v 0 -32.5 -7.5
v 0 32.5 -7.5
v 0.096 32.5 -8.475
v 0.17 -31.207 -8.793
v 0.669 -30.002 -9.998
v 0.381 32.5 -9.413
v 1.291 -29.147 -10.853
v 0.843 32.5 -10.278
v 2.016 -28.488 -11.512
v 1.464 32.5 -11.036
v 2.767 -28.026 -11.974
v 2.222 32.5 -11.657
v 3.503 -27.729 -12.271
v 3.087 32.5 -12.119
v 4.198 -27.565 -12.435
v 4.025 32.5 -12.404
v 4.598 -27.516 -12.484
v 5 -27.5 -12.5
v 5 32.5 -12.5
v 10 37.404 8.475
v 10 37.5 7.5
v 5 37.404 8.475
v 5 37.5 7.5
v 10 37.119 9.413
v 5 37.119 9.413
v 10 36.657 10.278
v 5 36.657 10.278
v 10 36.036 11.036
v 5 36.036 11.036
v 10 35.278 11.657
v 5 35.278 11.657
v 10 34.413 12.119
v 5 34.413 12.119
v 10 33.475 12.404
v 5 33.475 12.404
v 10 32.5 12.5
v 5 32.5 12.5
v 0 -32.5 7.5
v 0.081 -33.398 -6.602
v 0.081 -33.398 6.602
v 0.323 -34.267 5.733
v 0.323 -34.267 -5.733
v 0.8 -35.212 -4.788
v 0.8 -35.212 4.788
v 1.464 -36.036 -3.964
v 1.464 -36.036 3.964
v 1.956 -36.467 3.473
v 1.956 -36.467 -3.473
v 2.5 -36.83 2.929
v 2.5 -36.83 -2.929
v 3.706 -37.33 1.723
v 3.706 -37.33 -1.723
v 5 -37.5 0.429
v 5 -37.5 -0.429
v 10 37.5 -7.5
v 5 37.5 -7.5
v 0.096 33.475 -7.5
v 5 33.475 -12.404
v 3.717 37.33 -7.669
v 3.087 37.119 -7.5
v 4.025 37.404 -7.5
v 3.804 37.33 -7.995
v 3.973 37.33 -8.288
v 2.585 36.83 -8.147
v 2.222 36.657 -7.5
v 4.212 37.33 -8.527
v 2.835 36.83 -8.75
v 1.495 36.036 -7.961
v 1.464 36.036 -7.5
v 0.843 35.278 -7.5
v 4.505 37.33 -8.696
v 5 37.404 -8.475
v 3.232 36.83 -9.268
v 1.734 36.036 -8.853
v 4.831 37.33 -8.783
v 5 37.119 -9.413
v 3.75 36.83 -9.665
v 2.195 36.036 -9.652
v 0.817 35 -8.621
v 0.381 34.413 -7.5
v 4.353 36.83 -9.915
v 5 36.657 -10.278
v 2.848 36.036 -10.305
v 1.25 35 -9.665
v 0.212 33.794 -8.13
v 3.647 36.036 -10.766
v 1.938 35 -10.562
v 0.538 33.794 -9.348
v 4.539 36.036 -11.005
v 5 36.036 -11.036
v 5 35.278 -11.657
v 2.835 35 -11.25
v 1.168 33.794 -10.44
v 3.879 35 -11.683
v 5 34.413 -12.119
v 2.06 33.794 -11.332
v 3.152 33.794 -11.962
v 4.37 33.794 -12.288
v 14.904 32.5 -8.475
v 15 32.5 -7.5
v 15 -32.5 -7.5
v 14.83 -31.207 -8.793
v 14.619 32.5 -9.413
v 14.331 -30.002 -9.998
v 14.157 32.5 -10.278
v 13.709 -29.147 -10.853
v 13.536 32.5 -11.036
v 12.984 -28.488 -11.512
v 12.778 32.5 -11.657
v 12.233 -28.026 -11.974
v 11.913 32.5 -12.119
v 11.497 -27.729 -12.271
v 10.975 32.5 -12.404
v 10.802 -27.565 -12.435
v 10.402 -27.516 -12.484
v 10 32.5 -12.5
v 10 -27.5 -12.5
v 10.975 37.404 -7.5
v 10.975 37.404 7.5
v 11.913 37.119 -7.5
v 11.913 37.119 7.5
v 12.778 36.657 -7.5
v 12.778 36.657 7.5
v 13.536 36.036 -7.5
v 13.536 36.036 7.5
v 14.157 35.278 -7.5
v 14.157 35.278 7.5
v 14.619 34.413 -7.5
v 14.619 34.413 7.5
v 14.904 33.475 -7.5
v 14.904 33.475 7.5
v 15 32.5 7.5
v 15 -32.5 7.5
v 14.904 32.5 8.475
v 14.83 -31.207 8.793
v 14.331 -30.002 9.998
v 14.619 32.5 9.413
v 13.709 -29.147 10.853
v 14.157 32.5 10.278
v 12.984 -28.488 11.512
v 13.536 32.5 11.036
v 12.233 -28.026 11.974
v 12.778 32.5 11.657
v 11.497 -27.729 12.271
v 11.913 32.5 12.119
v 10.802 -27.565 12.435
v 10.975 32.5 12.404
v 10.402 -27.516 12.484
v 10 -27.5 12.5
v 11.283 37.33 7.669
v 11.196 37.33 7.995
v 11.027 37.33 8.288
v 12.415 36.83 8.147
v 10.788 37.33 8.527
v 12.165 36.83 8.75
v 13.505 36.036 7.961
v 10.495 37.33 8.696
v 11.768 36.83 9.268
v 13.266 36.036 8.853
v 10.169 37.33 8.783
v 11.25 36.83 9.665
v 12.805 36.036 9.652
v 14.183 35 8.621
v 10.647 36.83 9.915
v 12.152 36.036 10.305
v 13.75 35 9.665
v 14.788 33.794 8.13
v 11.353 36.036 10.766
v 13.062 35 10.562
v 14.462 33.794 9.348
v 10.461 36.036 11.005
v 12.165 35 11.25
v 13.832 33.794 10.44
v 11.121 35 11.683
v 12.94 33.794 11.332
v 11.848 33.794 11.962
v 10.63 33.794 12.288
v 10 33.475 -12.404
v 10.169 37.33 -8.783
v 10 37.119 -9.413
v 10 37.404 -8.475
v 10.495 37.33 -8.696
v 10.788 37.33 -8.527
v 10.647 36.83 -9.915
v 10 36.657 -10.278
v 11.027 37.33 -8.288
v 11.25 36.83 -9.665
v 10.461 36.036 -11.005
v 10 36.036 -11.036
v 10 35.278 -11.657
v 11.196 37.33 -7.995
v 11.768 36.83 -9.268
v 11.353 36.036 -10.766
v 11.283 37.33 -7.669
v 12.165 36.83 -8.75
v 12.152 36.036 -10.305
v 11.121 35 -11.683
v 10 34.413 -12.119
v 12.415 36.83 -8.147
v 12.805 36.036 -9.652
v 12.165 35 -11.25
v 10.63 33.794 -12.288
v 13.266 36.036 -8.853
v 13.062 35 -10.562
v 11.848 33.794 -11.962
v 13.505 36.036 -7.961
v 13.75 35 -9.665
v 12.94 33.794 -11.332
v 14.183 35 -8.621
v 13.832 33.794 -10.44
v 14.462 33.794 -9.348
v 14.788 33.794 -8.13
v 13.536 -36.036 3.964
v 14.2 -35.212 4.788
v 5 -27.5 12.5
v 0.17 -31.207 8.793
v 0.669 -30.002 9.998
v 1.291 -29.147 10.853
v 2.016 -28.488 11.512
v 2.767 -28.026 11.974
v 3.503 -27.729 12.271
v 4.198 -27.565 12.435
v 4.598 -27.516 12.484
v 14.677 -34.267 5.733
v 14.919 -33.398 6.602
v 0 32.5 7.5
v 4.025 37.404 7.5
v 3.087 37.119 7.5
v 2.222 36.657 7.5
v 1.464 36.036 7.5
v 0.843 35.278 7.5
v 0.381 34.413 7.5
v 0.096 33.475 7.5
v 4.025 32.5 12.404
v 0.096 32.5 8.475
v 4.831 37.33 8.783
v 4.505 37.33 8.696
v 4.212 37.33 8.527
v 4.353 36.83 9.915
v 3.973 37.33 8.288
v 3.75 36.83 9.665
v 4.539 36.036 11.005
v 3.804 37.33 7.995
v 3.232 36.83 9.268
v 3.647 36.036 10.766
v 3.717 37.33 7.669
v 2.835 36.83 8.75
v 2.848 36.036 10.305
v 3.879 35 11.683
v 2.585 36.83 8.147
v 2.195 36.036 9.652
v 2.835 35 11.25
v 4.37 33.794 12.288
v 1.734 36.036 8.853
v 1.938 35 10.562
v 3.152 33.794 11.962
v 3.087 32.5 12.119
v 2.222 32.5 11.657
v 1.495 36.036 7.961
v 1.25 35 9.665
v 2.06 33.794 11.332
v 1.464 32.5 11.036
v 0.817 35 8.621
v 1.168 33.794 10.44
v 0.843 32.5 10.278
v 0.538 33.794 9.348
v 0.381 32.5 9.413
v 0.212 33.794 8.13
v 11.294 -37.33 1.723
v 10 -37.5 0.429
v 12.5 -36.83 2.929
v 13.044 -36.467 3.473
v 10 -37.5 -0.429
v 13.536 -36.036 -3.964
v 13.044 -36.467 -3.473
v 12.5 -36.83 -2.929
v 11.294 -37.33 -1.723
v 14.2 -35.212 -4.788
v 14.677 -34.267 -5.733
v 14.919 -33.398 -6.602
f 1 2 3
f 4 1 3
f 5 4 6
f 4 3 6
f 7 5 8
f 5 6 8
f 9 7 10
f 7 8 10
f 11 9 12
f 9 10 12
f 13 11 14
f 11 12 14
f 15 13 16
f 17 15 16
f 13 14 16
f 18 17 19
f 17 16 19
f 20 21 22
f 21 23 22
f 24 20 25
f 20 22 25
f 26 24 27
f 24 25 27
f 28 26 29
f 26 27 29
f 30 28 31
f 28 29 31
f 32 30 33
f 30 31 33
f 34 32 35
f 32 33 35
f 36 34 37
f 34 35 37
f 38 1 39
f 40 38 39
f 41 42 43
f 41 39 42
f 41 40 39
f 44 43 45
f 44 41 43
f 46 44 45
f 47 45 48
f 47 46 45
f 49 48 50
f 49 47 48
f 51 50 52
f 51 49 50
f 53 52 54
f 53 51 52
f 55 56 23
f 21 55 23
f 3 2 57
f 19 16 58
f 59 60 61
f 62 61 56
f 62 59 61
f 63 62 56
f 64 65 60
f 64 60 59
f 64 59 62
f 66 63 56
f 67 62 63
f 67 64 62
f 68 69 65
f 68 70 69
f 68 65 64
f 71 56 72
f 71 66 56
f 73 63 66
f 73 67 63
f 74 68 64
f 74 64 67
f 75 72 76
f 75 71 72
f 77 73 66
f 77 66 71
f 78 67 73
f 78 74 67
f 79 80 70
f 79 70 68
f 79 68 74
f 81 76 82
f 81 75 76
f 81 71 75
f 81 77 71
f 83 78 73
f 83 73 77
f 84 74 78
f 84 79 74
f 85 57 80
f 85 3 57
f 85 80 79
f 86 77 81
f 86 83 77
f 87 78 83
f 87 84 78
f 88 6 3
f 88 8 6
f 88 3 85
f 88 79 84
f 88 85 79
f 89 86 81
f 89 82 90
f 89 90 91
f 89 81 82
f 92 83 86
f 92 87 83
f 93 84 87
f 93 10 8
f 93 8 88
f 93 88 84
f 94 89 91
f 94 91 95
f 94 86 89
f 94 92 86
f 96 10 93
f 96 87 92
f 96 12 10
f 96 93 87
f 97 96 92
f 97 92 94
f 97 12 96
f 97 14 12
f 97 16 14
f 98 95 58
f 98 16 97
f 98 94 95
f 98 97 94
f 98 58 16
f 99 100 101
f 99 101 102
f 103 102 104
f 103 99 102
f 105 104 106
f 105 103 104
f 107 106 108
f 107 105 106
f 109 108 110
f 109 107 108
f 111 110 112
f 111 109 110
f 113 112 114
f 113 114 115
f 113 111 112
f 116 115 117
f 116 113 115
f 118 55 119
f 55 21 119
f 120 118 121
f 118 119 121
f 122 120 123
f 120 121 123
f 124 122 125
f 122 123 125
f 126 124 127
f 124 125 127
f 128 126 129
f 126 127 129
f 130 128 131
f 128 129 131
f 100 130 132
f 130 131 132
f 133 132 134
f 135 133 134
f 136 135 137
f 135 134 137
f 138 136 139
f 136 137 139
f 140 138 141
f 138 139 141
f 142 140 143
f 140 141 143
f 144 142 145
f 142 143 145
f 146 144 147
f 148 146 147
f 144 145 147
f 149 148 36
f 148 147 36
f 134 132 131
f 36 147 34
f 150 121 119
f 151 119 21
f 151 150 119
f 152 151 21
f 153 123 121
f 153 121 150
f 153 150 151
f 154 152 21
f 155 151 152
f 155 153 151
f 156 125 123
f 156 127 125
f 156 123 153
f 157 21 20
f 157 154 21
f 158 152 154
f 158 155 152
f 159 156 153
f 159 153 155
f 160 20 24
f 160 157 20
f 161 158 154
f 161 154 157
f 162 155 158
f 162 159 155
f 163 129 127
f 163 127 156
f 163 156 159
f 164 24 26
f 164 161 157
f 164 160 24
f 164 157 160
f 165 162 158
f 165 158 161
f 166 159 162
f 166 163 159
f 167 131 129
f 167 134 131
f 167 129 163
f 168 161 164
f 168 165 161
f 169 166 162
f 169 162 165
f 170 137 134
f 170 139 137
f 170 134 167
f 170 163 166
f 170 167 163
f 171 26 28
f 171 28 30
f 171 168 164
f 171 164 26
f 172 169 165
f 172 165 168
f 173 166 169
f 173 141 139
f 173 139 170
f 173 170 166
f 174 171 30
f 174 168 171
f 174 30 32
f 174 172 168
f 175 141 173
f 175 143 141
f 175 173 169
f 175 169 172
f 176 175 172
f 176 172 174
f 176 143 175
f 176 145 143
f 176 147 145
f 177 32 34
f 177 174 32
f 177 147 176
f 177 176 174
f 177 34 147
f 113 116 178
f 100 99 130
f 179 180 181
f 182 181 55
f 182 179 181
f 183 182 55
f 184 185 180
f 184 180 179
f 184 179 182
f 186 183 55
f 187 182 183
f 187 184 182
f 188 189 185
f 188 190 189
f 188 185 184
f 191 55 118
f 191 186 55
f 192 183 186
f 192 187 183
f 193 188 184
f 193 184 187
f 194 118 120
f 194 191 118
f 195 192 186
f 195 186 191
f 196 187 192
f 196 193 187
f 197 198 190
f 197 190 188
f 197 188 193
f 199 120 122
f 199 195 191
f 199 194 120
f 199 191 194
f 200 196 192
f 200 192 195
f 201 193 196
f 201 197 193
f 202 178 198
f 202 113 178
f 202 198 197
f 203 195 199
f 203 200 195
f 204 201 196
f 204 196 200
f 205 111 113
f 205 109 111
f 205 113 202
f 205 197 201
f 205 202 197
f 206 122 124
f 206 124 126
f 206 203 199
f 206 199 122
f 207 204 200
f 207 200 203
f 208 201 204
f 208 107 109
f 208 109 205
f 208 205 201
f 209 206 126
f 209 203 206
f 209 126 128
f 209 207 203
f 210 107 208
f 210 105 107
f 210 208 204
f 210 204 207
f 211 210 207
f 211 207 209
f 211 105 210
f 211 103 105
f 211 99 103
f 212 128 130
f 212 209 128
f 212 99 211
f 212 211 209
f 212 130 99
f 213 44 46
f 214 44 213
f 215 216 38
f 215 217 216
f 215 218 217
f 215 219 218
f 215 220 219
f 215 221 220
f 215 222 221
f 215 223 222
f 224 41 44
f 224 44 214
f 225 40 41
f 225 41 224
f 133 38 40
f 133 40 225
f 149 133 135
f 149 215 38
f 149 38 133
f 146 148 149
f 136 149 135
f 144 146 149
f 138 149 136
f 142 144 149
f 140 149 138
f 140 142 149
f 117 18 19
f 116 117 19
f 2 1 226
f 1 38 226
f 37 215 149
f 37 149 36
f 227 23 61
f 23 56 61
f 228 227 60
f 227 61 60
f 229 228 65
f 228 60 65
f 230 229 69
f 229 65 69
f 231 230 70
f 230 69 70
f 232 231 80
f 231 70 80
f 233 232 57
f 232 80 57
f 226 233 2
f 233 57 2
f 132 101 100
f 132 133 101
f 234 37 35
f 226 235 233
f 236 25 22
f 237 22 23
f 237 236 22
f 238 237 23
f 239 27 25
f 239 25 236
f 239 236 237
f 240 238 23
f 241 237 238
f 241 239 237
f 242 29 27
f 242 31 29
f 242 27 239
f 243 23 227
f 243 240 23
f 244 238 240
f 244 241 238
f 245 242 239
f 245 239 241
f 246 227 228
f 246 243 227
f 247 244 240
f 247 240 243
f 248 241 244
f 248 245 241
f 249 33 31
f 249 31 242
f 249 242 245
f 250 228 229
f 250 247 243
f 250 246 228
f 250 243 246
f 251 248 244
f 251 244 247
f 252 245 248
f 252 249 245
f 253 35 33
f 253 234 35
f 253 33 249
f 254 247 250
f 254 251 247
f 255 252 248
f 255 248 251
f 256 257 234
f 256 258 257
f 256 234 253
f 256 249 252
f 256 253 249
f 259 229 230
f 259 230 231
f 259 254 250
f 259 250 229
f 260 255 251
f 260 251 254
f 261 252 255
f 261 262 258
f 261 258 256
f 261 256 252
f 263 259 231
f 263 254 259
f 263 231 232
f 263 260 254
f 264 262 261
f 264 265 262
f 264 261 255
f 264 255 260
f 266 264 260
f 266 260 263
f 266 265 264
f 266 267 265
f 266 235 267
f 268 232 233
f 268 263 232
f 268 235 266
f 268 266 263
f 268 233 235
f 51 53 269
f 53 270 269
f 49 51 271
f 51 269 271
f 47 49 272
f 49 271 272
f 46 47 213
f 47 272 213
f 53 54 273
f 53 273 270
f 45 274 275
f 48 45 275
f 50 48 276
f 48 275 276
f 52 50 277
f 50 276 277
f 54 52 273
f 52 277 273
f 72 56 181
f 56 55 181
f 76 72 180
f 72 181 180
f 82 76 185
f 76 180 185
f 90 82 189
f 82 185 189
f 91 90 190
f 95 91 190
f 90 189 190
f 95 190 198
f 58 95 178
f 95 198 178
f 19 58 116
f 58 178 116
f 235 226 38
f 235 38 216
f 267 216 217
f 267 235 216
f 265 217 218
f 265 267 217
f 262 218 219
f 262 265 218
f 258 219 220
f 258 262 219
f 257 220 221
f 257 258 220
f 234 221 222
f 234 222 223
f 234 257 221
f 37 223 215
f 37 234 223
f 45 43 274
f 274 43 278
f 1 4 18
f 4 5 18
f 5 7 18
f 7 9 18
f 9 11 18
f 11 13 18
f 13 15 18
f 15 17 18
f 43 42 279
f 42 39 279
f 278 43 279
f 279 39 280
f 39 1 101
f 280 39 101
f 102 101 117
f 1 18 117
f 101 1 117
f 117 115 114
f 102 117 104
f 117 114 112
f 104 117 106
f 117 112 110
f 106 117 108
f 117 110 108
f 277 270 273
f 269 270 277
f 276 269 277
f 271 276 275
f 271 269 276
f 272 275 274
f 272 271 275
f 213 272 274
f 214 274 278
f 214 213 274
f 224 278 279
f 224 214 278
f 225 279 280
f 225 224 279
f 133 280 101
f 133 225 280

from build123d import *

# Parameters (mm, degrees)
F0_W     = 75
F0_H     = 25
F1_DEPTH = 15
F2_SIZE  = 10
F3_SIZE  = 10
F4_R     = 5
F5_R     = 5
F6_R     = 4.99999


# Not quite as in the source:
# - a fillet or chamfer is up to 0.001 mm smaller than in the source, because OpenCascade refuses the exact size


with BuildPart() as f1:
    # F0 (on Right) → F1 (new body)
    with BuildSketch(Plane.YZ):
        Rectangle(F0_W, F0_H)
    extrude(amount=F1_DEPTH)

    # F2
    f2_edges = [f1.edges().sort_by_distance(p)[0] for p in [
        (7.5, -37.5, 12.5),
    ]]
    chamfer(f2_edges, length=F2_SIZE)

    # F3
    f3_edges = [f1.edges().sort_by_distance(p)[0] for p in [
        (7.5, -37.5, -12.5),
    ]]
    chamfer(f3_edges, length=F3_SIZE)

    # F4
    f4_edges = [f1.edges().sort_by_distance(p)[0] for p in [
        (15, 5, 12.5),
        (0, 5, 12.5),
        (15, 5, -12.5),
        (0, 5, -12.5),
    ]]
    fillet(f4_edges, radius=F4_R)

    # F5
    f5_edges = [f1.edges().sort_by_distance(p)[0] for p in [
        (7.5, 37.5, -12.5),
        (1.464466, 37.5, -11.035534),
        (13.535534, 37.5, -11.035534),
        (0, 37.5, 0),
        (15, 37.5, 0),
        (1.464466, 37.5, 11.035534),
        (13.535534, 37.5, 11.035534),
        (7.5, 37.5, 12.5),
    ]]
    fillet(f5_edges, radius=F5_R)

    # F6 (radius 5 in the source; OpenCascade refuses exactly that, so slightly less here)
    f6_edges = [f1.edges().sort_by_distance(p)[0] for p in [
        (0, -37.5, 0),
        (7.5, -37.5, -2.5),
        (7.5, -37.5, 2.5),
        (15, -37.5, 0),
    ]]
    fillet(f6_edges, radius=F6_R)


solid = f1.part
